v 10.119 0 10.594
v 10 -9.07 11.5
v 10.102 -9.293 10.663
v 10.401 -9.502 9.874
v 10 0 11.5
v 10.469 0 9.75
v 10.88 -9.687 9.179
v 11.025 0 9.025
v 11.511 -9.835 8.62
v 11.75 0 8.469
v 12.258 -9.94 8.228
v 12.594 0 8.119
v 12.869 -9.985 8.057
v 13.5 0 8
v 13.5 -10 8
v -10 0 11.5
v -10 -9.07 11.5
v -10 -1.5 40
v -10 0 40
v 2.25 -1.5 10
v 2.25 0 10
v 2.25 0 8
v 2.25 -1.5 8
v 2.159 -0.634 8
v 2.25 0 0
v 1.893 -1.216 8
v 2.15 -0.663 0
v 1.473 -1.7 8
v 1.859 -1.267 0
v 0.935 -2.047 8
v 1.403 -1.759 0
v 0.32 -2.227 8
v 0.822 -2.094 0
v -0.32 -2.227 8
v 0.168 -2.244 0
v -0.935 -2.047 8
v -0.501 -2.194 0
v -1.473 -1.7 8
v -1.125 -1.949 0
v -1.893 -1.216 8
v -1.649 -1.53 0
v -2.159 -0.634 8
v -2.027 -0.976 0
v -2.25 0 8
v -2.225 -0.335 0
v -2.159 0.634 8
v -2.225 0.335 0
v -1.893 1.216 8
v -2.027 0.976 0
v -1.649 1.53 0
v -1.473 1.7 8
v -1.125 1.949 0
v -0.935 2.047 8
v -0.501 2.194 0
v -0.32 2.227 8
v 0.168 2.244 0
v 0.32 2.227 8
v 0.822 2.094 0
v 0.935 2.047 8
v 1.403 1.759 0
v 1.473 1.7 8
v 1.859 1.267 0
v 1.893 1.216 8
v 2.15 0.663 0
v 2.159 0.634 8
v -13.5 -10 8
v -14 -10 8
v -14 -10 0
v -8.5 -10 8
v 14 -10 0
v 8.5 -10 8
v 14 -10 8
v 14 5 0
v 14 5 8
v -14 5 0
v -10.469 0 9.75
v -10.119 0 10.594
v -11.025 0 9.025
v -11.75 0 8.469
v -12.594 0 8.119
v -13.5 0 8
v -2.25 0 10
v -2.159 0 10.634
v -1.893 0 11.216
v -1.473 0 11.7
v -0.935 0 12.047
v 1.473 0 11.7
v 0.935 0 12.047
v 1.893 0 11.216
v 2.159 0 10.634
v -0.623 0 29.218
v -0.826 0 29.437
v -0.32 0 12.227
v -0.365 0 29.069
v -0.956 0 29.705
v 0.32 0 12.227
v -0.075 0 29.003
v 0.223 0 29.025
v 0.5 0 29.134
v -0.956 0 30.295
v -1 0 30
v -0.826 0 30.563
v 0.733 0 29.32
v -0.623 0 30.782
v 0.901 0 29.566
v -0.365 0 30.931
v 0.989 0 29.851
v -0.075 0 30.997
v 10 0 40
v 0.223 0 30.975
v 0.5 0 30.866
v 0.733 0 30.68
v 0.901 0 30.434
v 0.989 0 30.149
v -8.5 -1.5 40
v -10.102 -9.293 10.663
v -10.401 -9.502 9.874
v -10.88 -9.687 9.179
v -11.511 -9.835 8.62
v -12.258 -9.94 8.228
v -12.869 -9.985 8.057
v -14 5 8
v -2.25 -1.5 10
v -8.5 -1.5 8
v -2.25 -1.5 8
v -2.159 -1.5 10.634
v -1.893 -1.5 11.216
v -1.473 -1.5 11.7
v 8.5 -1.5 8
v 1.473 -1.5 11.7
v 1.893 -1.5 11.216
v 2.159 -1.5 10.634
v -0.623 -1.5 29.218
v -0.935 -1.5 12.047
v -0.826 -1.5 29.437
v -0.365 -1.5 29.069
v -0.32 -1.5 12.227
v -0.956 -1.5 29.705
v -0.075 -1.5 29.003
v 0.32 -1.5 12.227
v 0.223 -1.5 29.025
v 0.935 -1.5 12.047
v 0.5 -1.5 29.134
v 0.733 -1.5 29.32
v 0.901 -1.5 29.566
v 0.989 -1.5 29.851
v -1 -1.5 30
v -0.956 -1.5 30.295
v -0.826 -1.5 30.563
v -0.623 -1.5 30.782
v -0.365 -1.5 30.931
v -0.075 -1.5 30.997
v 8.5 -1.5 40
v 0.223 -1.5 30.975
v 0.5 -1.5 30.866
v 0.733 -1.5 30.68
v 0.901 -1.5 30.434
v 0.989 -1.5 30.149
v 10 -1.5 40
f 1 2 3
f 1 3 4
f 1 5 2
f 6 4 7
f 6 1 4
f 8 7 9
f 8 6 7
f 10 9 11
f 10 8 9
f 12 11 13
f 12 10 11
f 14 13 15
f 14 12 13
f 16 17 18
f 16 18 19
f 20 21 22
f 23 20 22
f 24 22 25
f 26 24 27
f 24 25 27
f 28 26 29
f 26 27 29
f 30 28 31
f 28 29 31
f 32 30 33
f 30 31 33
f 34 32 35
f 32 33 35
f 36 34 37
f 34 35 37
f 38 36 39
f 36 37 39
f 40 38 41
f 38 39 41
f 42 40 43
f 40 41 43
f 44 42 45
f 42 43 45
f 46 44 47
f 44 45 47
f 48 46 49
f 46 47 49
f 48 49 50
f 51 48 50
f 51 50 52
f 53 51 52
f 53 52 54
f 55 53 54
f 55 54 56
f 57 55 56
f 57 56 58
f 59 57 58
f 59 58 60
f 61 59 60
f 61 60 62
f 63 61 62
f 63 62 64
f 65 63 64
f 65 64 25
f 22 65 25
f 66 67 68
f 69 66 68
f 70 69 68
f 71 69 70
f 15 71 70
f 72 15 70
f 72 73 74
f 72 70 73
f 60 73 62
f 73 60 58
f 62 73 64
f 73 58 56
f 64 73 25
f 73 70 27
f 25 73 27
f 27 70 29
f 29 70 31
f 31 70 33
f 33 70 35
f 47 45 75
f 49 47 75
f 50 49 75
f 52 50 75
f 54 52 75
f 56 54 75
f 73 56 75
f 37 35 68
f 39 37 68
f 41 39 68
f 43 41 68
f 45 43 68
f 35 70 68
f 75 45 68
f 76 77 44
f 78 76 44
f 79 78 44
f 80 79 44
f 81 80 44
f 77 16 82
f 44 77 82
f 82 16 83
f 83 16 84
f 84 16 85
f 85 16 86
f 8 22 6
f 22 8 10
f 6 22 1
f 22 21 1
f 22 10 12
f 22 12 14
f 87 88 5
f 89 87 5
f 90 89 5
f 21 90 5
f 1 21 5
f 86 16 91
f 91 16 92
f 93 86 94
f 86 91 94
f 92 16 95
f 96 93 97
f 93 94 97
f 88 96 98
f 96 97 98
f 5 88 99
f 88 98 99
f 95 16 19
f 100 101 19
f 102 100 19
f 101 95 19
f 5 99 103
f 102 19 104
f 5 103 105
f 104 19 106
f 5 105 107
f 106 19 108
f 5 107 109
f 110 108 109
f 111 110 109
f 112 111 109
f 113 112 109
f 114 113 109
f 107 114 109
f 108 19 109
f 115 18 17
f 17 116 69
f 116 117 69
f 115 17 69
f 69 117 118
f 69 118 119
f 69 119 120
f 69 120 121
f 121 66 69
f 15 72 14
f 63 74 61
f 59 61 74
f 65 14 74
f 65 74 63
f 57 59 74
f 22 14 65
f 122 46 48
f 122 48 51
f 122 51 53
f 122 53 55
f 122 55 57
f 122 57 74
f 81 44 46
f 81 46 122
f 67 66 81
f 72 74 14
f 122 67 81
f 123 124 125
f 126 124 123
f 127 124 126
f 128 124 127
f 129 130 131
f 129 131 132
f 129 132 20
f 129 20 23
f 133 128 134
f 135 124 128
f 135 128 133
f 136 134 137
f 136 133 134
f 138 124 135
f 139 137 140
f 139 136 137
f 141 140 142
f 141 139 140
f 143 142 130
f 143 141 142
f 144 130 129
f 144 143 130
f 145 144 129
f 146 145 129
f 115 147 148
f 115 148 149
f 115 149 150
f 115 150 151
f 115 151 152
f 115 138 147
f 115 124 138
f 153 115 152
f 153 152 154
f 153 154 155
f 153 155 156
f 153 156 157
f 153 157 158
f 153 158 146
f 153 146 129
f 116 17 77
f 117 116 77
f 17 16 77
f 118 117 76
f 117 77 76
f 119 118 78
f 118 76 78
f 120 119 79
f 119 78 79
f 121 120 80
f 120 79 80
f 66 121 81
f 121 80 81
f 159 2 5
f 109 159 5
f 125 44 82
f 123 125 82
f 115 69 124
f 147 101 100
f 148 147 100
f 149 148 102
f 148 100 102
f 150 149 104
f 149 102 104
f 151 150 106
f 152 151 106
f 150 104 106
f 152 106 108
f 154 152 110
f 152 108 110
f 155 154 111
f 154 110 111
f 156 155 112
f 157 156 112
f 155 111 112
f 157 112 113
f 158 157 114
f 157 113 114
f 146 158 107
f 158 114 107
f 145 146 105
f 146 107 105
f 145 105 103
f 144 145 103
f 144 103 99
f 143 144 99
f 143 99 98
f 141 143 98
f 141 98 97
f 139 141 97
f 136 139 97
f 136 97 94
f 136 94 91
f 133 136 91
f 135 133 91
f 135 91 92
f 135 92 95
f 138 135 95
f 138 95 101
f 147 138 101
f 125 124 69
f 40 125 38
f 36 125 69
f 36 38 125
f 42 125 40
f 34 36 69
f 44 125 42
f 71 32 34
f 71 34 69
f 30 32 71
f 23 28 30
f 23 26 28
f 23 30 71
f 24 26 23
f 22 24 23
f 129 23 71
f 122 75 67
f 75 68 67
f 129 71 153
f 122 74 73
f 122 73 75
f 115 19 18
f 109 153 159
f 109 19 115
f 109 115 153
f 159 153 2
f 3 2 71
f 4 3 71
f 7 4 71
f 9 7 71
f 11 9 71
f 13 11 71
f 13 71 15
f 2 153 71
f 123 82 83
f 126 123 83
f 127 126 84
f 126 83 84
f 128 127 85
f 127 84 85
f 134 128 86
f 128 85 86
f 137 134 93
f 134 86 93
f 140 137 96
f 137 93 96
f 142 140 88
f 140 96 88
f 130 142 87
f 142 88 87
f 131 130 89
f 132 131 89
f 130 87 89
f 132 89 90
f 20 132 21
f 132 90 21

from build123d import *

# Parameters (mm, degrees)
F0_W      = 28
F0_H      = 40
F1_DEPTH  = 10
F2_W      = 4
F2_H      = 10
F2_W_2    = 17
F2_H_2    = 8.5
F3_DEPTH  = 32
F5_DEPTH  = 24.001
F6_W      = 28
F6_H      = 8
F7_DEPTH  = 5
F8_R      = 1
F9_DEPTH  = 10.001
F10_R     = 2.25
F11_DEPTH = 9
F13_DEPTH = 10.001
F14_R     = 3.5


with BuildPart() as f1:
    # F0 (on Front) → F1 (new body)
    with BuildSketch(Plane.XZ):
        with Locations((0, 20)):
            Rectangle(F0_W, F0_H)
    extrude(amount=F1_DEPTH)

    # F2 (on face) → F3 (cut)
    with BuildSketch(Plane.XY.offset(40)):
        with Locations((-12, -5)):
            Rectangle(F2_W, F2_H)
        with Locations((12, -5)):
            Rectangle(F2_W, F2_H)
        with Locations((0, -5.75)):
            Rectangle(F2_W_2, F2_H_2)
    extrude(amount=-F3_DEPTH, mode=Mode.SUBTRACT)

    # F4 (on face) → F5 (cut, through all)
    with BuildSketch(Plane(origin=(-10, 0, 0), x_dir=(0, -1, 0), z_dir=(-1, 0, 0))):
        Polygon((1.5, 40), (10, 8), (10, 40), align=None)
    extrude(amount=-F5_DEPTH, mode=Mode.SUBTRACT)

    # F6 (on face) → F7 (join)
    with BuildSketch(Plane(origin=(0, 0, 0), x_dir=(-1, 0, 0), z_dir=(0, 1, 0))):
        with Locations((0, 4)):
            Rectangle(F6_W, F6_H)
    extrude(amount=F7_DEPTH)

    # F8 (on face) → F9 (cut, through all)
    with BuildSketch(Plane(origin=(0, 0, 0), x_dir=(-1, 0, 0), z_dir=(0, 1, 0))):
        with Locations((0, 30)):
            Circle(F8_R)
    extrude(amount=-F9_DEPTH, mode=Mode.SUBTRACT)

    # F10 (on face) → F11 (cut)
    with BuildSketch(Plane(origin=(0, 0, 0), x_dir=(1, 0, 0), z_dir=(0, 0, -1))):
        Circle(F10_R)
    extrude(amount=-F11_DEPTH, mode=Mode.SUBTRACT)

    # F12 (on face) → F13 (cut, through all)
    with BuildSketch(Plane(origin=(0, 0, 0), x_dir=(-1, 0, 0), z_dir=(0, 1, 0))):
        with BuildLine():
            Line((-2.25, 10), (-2.25, 8))
            Line((-2.25, 8), (2.25, 8))
            Line((2.25, 8), (2.25, 10))
            ThreePointArc((2.25, 10), (0, 12.25), (-2.25, 10))
        make_face()
    extrude(amount=-F13_DEPTH, mode=Mode.SUBTRACT)

    # F14
    f14_edges = [f1.edges().sort_by_distance(p)[0] for p in [
        (10, -5, 8),
        (-10, -5, 8),
    ]]
    fillet(f14_edges, radius=F14_R)


solid = f1.part
